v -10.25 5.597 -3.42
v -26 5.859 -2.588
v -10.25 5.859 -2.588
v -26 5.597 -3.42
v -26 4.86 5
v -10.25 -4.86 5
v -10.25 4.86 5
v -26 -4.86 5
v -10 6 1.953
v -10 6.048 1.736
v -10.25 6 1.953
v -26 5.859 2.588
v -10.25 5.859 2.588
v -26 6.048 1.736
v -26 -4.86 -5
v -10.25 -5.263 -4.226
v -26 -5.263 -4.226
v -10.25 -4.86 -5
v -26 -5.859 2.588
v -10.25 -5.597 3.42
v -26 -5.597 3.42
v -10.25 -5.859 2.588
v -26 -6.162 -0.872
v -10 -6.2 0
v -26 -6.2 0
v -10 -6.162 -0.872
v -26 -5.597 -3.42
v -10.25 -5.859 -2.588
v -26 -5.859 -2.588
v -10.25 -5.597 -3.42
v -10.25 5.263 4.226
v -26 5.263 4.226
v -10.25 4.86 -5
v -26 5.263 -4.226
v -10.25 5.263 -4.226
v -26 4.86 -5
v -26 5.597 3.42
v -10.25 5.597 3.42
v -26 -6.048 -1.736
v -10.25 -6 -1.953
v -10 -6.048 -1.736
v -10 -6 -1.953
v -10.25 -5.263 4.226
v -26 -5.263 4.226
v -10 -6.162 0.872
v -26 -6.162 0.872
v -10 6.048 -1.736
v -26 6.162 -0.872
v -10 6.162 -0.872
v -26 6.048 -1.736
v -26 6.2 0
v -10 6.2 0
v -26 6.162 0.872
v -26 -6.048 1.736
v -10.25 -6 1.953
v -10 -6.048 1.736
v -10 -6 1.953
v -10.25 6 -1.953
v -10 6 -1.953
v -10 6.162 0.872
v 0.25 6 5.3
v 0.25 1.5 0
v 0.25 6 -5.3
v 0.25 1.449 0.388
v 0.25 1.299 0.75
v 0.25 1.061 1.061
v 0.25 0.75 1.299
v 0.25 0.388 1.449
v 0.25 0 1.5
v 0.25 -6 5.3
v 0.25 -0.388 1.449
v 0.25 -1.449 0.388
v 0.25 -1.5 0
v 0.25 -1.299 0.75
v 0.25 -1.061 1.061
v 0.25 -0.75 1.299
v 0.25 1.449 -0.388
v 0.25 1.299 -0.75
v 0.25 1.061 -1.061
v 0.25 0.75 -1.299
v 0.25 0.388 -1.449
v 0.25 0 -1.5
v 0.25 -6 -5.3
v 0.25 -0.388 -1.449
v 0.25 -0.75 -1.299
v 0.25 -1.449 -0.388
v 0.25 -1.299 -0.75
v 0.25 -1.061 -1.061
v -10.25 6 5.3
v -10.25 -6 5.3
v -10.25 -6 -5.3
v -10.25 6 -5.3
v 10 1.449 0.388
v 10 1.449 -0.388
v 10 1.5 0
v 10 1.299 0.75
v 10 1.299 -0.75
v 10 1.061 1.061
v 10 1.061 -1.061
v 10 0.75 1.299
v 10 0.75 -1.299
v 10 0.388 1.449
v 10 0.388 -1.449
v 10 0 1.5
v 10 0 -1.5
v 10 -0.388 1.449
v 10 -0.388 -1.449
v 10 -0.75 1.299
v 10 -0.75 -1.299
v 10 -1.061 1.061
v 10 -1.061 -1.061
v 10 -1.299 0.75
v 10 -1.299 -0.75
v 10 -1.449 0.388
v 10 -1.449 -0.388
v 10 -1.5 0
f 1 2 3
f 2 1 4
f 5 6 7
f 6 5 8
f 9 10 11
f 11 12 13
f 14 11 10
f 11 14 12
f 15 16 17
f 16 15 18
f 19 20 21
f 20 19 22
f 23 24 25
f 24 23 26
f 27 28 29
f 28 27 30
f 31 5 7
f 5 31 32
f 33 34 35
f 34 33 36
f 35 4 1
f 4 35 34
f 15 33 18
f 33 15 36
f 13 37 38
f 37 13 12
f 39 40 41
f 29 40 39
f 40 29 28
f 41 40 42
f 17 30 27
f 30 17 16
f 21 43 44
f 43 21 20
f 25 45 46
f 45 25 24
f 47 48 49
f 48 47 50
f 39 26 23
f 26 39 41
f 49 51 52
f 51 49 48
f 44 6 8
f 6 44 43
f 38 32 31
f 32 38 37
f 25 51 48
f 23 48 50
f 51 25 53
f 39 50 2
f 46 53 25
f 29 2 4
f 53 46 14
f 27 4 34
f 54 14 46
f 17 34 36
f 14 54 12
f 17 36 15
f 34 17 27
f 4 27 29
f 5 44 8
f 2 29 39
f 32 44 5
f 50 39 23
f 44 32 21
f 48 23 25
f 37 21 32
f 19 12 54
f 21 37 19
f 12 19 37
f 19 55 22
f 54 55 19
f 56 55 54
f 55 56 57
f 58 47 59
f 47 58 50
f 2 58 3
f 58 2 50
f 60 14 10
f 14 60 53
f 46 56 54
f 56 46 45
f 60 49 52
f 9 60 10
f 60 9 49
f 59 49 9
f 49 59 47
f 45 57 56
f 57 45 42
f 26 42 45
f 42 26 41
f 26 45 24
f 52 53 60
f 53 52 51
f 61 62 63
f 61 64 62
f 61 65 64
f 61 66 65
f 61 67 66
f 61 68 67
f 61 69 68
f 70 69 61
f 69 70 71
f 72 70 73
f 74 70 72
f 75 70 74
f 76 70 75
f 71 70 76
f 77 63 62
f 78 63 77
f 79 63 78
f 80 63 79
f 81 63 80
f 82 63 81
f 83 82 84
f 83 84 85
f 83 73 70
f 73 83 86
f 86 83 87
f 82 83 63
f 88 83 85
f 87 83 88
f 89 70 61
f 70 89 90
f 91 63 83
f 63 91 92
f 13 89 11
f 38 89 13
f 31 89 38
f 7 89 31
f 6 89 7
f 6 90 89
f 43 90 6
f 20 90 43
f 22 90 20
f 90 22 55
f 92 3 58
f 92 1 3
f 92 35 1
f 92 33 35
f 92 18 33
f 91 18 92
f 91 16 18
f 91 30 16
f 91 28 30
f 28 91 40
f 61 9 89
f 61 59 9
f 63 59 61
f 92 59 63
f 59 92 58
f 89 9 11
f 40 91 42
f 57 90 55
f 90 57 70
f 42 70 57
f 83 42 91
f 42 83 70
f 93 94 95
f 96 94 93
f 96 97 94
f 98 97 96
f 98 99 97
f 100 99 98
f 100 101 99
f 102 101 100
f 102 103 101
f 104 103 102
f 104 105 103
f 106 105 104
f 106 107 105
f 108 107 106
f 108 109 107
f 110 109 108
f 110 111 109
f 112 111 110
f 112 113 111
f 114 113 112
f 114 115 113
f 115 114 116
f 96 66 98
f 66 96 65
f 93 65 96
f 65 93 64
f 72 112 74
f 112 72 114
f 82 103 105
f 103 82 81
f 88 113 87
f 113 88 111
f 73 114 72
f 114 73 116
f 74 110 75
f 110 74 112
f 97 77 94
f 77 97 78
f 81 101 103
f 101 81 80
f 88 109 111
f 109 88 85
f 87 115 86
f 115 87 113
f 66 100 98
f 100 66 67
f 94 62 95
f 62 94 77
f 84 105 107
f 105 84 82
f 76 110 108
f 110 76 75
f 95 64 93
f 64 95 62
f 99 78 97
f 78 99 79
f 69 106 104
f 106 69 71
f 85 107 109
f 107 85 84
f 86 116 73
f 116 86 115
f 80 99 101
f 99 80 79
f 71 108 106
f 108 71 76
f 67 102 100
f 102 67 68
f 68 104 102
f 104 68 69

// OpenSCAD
/*
 * N20 gear motor
 */

$fs = 0.4; // millimetres; smallest segment

motor_w = 16; // Width of motor (x axis)
motor_h = 10; // motor height
motor_d = 12; // y
gearbox_h = 10.6;
gearbox_d = 12;
gearbox_w = 10;
 
module n20_motor(margin=0.2)
{
    motor_d_half = motor_d / 2;
    motor_w_half = motor_w / 2;
    gearbox_w_half = gearbox_w / 2;
    // Oval motor body
    curve_rad = 10;
    translate([-motor_w_half - gearbox_w,0,0])
    rotate([0,90,0]) {
        $fa = 5.0; // more polygons?
        linear_extrude(motor_w, center=true) {
            intersection() {
                translate([0, motor_d_half - curve_rad + margin])
                    circle(r=curve_rad);
                translate([0, -motor_d_half + curve_rad - margin])
                    circle(r=curve_rad);
                square([motor_h,motor_d + (margin*2)], center=true);
            }
        }
    }
    // Cube gearbox
    translate([- gearbox_w_half, 0,0]) {
        cube([ gearbox_w + 0.1 + (margin*2), gearbox_d, gearbox_h], center=true); 
    }
    // Shaft
    translate([0,0,0]) {
        rotate([0,90,0]) {
            cylinder(h=10, r=1.5);
        }
    }
}

module n20_motor_top_ext(back_part=6.0) {
    // Motor with a box on top
    // And a cylinder out the back.
    n20_motor();
    translate([-motor_w-gearbox_w, -(motor_d/2), motor_h/2 - 0.2])
        cube([motor_w+gearbox_w, gearbox_d, gearbox_h]);
        
    // This is a cutout for wiring, terminals etc
    back_x = -motor_w-gearbox_w - back_part;
    translate([back_x, -(motor_d/2) + 1, -motor_h/2 + 2]) {
        cube([back_part + 0.2, motor_d - 2, motor_h + 0.2]);
    }
}

n20_motor();
